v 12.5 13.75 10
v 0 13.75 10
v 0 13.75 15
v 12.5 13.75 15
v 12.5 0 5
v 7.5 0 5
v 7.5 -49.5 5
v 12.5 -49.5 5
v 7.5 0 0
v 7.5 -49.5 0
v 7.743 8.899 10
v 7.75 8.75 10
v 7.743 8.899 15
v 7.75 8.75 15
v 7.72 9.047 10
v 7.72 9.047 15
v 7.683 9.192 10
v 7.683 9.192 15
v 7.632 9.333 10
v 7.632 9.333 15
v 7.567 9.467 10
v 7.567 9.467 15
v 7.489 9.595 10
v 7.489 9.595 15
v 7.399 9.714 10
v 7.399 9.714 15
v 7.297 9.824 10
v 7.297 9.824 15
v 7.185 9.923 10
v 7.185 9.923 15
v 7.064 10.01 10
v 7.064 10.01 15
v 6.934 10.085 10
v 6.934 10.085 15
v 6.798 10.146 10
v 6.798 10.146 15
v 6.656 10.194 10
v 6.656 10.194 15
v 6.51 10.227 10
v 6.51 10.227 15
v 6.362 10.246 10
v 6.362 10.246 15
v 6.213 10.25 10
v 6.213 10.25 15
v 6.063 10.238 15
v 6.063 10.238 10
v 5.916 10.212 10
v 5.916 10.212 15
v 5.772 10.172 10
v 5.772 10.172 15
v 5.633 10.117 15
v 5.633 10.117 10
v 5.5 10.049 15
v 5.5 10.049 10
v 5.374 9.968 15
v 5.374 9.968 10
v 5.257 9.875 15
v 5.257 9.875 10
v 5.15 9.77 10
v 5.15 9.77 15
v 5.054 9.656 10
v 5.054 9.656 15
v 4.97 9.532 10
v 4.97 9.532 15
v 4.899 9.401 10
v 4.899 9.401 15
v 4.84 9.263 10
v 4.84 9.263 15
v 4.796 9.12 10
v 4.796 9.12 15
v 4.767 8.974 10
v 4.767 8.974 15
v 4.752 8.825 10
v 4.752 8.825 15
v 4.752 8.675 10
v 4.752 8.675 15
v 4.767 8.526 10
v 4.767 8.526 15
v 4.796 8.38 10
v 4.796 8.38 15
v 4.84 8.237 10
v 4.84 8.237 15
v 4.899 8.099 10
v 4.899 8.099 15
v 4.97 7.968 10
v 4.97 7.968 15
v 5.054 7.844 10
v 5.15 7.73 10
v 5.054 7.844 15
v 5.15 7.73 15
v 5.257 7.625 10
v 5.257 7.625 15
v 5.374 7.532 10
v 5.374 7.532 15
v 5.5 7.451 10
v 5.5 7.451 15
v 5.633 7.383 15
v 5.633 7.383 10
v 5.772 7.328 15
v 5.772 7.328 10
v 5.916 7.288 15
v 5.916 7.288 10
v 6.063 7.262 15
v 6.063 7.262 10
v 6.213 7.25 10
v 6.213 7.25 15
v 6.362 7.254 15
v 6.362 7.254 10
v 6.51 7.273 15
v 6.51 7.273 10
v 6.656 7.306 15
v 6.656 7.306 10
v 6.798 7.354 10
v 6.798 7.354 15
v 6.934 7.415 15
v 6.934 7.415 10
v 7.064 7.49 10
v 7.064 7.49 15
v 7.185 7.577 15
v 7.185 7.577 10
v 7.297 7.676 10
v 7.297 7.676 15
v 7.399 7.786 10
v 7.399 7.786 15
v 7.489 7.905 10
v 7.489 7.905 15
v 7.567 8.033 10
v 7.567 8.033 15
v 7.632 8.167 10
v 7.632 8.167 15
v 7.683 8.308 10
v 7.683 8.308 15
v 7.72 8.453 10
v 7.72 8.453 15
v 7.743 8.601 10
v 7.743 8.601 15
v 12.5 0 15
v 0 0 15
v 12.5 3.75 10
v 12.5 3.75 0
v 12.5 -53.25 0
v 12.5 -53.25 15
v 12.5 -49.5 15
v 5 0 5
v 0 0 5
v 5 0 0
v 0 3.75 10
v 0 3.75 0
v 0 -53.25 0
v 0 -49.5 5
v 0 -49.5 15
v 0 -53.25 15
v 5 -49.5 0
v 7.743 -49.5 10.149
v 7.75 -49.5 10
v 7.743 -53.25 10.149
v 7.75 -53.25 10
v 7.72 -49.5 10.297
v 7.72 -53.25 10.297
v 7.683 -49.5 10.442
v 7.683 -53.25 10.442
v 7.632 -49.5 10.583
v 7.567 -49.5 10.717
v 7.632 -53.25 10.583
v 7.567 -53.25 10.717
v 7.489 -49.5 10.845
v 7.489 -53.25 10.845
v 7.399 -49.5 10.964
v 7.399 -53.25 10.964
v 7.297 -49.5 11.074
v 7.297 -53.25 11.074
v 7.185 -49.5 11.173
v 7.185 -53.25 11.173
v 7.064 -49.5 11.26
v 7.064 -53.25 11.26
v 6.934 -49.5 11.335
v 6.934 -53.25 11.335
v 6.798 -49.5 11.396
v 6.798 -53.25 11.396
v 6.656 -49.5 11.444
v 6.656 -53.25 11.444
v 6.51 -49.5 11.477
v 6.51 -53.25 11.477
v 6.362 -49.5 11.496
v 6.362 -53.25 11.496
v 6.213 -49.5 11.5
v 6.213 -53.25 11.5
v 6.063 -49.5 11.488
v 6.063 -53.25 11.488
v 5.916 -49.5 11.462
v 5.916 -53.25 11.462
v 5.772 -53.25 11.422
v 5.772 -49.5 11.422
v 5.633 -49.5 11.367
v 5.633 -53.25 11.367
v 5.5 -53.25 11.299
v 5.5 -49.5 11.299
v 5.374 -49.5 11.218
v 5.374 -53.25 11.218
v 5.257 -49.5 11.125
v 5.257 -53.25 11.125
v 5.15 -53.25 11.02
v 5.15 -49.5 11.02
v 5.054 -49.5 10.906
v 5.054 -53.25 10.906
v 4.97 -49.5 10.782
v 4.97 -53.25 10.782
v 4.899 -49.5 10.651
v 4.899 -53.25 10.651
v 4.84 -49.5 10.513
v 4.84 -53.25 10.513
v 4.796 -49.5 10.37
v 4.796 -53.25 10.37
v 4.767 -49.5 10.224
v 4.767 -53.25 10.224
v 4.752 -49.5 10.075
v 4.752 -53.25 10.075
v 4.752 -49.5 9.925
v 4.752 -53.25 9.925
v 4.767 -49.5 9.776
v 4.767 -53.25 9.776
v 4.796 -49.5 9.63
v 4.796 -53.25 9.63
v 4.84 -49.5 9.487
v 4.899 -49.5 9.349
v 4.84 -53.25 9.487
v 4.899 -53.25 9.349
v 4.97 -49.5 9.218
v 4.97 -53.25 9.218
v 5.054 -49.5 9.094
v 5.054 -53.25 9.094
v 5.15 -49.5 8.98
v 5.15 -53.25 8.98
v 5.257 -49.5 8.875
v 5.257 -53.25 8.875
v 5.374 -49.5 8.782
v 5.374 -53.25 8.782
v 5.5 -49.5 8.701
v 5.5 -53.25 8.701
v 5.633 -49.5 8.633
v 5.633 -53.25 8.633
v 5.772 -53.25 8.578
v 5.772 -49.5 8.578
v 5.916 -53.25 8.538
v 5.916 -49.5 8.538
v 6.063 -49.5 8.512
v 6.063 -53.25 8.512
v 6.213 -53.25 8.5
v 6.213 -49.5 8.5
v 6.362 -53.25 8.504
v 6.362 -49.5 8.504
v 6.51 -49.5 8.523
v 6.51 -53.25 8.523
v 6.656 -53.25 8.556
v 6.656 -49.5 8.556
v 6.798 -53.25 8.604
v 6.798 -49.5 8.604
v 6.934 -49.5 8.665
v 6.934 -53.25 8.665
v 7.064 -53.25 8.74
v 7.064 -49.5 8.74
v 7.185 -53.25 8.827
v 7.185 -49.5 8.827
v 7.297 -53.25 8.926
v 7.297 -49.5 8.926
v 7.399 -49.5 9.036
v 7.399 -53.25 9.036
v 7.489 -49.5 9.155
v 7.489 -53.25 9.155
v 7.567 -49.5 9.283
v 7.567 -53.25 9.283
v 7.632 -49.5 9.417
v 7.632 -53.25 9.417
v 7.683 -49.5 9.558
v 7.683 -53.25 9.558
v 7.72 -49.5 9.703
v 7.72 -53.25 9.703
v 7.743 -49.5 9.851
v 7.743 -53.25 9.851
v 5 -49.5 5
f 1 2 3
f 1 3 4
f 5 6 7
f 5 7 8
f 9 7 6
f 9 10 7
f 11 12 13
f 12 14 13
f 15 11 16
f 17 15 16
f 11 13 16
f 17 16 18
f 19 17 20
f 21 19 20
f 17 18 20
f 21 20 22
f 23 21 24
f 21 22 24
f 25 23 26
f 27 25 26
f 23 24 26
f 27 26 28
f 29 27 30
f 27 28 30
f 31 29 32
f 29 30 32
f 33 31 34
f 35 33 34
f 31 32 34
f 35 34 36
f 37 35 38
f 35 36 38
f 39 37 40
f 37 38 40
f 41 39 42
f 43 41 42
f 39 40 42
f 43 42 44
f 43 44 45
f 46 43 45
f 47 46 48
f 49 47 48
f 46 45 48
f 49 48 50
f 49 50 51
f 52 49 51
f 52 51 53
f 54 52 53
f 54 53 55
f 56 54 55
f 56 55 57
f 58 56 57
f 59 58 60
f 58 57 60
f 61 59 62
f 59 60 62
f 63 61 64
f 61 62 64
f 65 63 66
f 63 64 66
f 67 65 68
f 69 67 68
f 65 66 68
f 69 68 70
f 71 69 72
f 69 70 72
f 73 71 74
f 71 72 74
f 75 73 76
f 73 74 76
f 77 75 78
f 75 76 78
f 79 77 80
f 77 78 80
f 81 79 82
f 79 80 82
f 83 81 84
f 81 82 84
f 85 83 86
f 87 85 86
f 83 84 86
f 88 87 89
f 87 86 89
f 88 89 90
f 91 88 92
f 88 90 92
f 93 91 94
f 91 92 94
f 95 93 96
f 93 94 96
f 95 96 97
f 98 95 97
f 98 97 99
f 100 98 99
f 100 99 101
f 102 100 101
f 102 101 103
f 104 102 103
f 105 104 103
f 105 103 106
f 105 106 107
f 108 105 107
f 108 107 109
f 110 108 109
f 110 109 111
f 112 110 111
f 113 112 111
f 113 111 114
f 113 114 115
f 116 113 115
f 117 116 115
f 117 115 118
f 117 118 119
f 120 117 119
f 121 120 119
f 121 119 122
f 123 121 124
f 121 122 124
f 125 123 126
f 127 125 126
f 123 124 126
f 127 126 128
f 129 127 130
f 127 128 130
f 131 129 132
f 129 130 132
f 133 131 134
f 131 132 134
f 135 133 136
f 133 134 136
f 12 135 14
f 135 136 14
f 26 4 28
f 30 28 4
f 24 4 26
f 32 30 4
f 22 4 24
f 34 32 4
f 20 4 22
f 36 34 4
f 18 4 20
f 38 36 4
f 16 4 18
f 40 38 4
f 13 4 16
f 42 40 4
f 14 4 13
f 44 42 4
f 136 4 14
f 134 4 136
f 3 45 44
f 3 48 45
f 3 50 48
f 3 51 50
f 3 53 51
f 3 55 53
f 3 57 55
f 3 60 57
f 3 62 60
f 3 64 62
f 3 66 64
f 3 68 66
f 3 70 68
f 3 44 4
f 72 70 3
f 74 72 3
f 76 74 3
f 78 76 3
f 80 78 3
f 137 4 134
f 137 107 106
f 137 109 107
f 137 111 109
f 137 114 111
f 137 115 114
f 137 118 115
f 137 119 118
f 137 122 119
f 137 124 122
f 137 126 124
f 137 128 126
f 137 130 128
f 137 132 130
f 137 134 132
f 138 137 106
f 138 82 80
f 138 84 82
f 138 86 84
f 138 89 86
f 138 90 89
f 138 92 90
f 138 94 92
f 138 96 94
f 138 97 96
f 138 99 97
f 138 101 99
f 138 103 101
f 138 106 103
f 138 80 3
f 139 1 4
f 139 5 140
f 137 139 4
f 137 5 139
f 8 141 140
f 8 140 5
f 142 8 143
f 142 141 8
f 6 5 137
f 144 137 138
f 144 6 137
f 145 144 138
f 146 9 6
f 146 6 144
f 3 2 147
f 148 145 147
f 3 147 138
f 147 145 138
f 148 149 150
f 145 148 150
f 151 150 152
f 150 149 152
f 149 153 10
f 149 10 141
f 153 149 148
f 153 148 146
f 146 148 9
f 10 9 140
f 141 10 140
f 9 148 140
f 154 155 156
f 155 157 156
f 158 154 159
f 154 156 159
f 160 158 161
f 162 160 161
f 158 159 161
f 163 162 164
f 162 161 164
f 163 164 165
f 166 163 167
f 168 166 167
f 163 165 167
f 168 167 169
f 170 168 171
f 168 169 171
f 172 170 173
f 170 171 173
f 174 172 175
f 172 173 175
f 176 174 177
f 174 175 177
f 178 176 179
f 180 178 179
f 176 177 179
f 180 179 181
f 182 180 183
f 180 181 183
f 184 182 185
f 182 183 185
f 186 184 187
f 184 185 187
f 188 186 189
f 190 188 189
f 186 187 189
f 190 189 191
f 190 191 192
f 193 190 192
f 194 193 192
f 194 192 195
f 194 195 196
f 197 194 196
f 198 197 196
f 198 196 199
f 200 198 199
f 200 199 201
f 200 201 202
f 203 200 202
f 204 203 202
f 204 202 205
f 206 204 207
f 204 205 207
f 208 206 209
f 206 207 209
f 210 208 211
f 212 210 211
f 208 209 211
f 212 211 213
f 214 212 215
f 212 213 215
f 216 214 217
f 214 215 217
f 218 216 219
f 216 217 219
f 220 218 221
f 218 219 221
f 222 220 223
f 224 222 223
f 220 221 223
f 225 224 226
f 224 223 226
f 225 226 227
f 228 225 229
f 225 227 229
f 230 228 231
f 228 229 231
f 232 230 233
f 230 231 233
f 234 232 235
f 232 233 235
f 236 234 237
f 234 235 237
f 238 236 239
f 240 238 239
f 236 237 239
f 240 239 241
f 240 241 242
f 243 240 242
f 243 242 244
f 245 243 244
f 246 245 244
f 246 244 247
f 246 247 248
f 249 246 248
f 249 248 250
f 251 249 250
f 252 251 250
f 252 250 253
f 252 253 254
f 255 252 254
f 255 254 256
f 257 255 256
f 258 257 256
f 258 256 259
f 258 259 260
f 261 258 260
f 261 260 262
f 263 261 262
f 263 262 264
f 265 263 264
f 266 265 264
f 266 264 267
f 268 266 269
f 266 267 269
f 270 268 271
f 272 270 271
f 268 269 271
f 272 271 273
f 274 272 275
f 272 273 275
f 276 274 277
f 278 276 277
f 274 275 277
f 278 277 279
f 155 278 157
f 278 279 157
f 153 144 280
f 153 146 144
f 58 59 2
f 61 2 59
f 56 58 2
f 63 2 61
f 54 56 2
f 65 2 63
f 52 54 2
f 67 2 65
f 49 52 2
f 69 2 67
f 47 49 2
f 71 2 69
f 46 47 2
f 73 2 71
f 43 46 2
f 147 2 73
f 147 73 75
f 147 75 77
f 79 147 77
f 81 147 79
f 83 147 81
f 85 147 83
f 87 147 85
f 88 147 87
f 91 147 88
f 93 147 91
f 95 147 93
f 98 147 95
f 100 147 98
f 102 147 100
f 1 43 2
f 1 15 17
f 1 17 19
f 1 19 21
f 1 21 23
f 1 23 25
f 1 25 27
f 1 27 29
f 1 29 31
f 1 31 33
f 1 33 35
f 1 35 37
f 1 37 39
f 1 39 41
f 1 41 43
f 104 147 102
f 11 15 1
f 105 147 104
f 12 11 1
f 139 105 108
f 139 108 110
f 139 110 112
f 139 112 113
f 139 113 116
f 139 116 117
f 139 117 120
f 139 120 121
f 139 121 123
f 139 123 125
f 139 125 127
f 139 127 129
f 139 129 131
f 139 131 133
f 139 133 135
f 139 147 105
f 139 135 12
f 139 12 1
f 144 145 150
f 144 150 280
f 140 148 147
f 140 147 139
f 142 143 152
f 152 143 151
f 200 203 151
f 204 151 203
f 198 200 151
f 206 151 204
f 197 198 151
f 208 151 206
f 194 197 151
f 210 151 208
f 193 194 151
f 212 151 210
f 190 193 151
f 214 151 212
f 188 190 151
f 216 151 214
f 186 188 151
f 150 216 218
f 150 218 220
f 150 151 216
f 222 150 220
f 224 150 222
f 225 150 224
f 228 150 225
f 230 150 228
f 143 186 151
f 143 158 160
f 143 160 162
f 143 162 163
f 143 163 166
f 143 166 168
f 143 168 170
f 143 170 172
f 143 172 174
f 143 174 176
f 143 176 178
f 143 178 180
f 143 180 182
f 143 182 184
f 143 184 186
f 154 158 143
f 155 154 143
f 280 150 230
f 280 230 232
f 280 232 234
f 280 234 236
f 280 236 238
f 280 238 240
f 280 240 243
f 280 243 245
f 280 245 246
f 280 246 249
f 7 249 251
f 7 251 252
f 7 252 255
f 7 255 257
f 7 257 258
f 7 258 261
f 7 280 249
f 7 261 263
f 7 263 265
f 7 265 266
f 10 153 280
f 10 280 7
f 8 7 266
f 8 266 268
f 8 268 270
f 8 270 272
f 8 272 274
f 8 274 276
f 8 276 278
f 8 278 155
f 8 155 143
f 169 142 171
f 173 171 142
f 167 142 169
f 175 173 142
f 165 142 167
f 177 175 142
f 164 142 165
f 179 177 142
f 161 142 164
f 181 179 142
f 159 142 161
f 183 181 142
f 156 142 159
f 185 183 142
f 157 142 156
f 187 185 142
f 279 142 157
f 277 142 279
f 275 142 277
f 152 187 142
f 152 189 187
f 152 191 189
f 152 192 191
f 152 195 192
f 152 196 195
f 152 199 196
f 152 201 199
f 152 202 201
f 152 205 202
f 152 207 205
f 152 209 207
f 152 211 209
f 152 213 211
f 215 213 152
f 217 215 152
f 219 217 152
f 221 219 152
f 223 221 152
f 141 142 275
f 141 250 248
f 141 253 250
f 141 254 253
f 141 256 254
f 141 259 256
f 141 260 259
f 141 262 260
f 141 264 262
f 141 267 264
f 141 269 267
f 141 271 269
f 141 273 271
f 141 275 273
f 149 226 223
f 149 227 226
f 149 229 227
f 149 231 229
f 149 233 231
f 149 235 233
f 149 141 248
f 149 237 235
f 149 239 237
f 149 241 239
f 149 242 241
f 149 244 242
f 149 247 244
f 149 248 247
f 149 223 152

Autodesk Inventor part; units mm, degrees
ref_plane "YZ Plane" through (0, 0, 0) normal (1, 0, 0) x (0, 1, 0)
ref_plane "XZ Plane" through (0, 0, 0) normal (0, 1, 0) x (-1, 0, 0)
ref_plane "XY Plane" through (0, 0, 0) normal (0, 0, 1) x (1, 0, 0)
sketch "Sketch1" plane through (0, 0, 0) normal (0, 0, 1) x (1, 0, 0)
  line L0 (0, 0) -> (12.5, 0)
  line L1 (12.5, 0) -> (12.5, 5)
  line L2 (12.5, 5) -> (0, 5)
  line L3 (0, 5) -> (0, 0)
  line L4 (0, 0) -> (5, 0) construction
  line L5 (12.5, 0) -> (7.5, 0) construction
  line L6 (0, 0) -> (5, 0) construction
  line L7 (5, 0) -> (5, -49.5) construction
  line L8 (5, -49.5) -> (0, -49.5) construction
  line L9 (0, -49.5) -> (0, 0) construction
  line L10 (0, 0) -> (5, 0)
  line L11 (5, 0) -> (5, -49.5)
  line L12 (5, -49.5) -> (0, -49.5)
  line L13 (0, -49.5) -> (0, 0)
  line L14 (7.5, 0) -> (12.5, 0)
  line L15 (12.5, 0) -> (12.5, -49.5)
  line L16 (12.5, -49.5) -> (7.5, -49.5)
  line L17 (7.5, -49.5) -> (7.5, 0)
  dimension "d0" = 12.5
  dimension "d1" = 5
  dimension "d2" = 5
  dimension "d3" = 5
  dimension "d4" = 49.5
extrude "Extrusion1" add sketch "Sketch1" along normal blind 5 contours L0 L11 L12 L13 | L0 L15 L16 L17
sketch "Sketch2" plane through (0, 0, 0) normal (0, 0, -1) x (-1, 0, 0)
  line L0 (-12.5, -49.5) -> (-12.5, 0) projected
  line L1 (-7.5, -49.5) -> (-12.5, -49.5) projected
  line L2 (-7.5, 0) -> (-7.5, -49.5) projected
  line L3 (-12.5, 0) -> (-7.5, 0) projected
  line L4 (0, -49.5) -> (-5, -49.5) projected
  line L5 (0, 0) -> (0, -49.5) projected
  line L6 (-5, 0) -> (0, 0) projected
  line L7 (-5, -49.5) -> (-5, 0) projected
  line L8 (-12.5, 0) -> (0, 0)
  line L9 (0, 0) -> (0, 3.75)
  line L10 (0, 3.75) -> (-12.5, 3.75)
  line L11 (-12.5, 3.75) -> (-12.5, 0)
  line L12 (0, -49.5) -> (-5, -49.5) projected
  line L13 (0, -49.5) -> (-12.5, -49.5)
  line L14 (-12.5, -49.5) -> (-12.5, -53.25)
  line L15 (-12.5, -53.25) -> (0, -53.25)
  line L16 (0, -53.25) -> (0, -49.5)
  point P0 (-5, -49.5)
  point P1 (-7.5, -49.5)
  dimension "d7" = 3.75
  dimension "d10" = 3.75
extrude "Extrusion2" add sketch "Sketch2" against normal blind 15 contours L1 L13 L4 L16 L15 L14 | L11 L10 L9 L6 L8 L3
sketch "Sketch4" plane through (0, -53.25, 0) normal (0, -1, 0) x (1, 0, 0)
  line L0 (7.5, 5) -> (12.5, 5) projected
  line L1 (0, 5) -> (5, 5) projected
  line L2 (12.5, 5) -> (12.5, 15) construction
  line L3 (12.5, 0) -> (0, 0) construction
  line L4 (12.5, 15) -> (0, 15) construction
  line L5 (0, 15) -> (0, 0) construction
  line L6 (0, 0) -> (12.5, 0) construction
  line L7 (12.5, 0) -> (12.5, 15) construction
  line L8 (12.5, 15) -> (0, 15) construction
  line L9 (0, 5) -> (12.5, 5) construction
  line L10 (12.5, 5) -> (12.5, 15) construction
  line L11 (12.5, 15) -> (0, 15) construction
  line L12 (0, 15) -> (0, 5) construction
  circle A0 centre (6.25, 10) radius 1.5
  dimension "d12" = 3
extrude "Extrusion3" cut sketch "Sketch4" against normal blind 10
sketch "Sketch5" plane through (0, 3.75, 0) normal (0, 1, 0) x (1, 0, 0)
  line L0 (5, -5) -> (0, -5) projected
  line L1 (12.5, -5) -> (7.5, -5) projected
  line L2 (0, 0) -> (12.5, 0) projected
  line L3 (0, 0) -> (0, -15) projected
  line L4 (12.5, -15) -> (0, -15) projected
  line L5 (12.5, 0) -> (12.5, -15) projected
  line L6 (0, 0) -> (0, -15) construction
  line L7 (7.5, -5) -> (12.5, -5) construction
  line L8 (0, 0) -> (12.5, 0) construction
  line L9 (12.5, 0) -> (12.5, -5) construction
  line L10 (12.5, -5) -> (0, -5) construction
  line L11 (0, -5) -> (0, 0) construction
  line L12 (12.5, 0) -> (12.5, -15) projected
  line L13 (12.5, -15) -> (0, -15)
  line L14 (0, -15) -> (0, -10)
  line L15 (0, -10) -> (12.5, -10)
  line L16 (12.5, -10) -> (12.5, -15)
  point P0 (0, -10)
  dimension "d15" = 12.5
  dimension "d16" = 15
  dimension "d17" = 5
  dimension "d18" = 5
extrude "Extrusion4" add sketch "Sketch5" along normal blind 10 contours L15 L5 L4 L3
sketch "Sketch6" plane through (0, 0, 15) normal (0, 0, 1) x (1, 0, 0)
  line L0 (0, 3.75) -> (12.5, 3.75) projected
  line L1 (0, 13.75) -> (12.5, 13.75) projected
  line L2 (0, 0) -> (0, 13.75) construction
  line L3 (0, 3.75) -> (12.5, 3.75) construction
  line L4 (0, 13.75) -> (12.5, 13.75) construction
  line L5 (12.5, 13.75) -> (12.5, 3.75) construction
  line L6 (12.5, 3.75) -> (0, 3.75) construction
  line L7 (0, 3.75) -> (0, 13.75) construction
  circle A0 centre (6.25, 8.75) radius 1.5
  dimension "d21" = 3
extrude "Extrusion5" cut sketch "Sketch6" against normal blind 10
properties part number "PistaSistBloq"
